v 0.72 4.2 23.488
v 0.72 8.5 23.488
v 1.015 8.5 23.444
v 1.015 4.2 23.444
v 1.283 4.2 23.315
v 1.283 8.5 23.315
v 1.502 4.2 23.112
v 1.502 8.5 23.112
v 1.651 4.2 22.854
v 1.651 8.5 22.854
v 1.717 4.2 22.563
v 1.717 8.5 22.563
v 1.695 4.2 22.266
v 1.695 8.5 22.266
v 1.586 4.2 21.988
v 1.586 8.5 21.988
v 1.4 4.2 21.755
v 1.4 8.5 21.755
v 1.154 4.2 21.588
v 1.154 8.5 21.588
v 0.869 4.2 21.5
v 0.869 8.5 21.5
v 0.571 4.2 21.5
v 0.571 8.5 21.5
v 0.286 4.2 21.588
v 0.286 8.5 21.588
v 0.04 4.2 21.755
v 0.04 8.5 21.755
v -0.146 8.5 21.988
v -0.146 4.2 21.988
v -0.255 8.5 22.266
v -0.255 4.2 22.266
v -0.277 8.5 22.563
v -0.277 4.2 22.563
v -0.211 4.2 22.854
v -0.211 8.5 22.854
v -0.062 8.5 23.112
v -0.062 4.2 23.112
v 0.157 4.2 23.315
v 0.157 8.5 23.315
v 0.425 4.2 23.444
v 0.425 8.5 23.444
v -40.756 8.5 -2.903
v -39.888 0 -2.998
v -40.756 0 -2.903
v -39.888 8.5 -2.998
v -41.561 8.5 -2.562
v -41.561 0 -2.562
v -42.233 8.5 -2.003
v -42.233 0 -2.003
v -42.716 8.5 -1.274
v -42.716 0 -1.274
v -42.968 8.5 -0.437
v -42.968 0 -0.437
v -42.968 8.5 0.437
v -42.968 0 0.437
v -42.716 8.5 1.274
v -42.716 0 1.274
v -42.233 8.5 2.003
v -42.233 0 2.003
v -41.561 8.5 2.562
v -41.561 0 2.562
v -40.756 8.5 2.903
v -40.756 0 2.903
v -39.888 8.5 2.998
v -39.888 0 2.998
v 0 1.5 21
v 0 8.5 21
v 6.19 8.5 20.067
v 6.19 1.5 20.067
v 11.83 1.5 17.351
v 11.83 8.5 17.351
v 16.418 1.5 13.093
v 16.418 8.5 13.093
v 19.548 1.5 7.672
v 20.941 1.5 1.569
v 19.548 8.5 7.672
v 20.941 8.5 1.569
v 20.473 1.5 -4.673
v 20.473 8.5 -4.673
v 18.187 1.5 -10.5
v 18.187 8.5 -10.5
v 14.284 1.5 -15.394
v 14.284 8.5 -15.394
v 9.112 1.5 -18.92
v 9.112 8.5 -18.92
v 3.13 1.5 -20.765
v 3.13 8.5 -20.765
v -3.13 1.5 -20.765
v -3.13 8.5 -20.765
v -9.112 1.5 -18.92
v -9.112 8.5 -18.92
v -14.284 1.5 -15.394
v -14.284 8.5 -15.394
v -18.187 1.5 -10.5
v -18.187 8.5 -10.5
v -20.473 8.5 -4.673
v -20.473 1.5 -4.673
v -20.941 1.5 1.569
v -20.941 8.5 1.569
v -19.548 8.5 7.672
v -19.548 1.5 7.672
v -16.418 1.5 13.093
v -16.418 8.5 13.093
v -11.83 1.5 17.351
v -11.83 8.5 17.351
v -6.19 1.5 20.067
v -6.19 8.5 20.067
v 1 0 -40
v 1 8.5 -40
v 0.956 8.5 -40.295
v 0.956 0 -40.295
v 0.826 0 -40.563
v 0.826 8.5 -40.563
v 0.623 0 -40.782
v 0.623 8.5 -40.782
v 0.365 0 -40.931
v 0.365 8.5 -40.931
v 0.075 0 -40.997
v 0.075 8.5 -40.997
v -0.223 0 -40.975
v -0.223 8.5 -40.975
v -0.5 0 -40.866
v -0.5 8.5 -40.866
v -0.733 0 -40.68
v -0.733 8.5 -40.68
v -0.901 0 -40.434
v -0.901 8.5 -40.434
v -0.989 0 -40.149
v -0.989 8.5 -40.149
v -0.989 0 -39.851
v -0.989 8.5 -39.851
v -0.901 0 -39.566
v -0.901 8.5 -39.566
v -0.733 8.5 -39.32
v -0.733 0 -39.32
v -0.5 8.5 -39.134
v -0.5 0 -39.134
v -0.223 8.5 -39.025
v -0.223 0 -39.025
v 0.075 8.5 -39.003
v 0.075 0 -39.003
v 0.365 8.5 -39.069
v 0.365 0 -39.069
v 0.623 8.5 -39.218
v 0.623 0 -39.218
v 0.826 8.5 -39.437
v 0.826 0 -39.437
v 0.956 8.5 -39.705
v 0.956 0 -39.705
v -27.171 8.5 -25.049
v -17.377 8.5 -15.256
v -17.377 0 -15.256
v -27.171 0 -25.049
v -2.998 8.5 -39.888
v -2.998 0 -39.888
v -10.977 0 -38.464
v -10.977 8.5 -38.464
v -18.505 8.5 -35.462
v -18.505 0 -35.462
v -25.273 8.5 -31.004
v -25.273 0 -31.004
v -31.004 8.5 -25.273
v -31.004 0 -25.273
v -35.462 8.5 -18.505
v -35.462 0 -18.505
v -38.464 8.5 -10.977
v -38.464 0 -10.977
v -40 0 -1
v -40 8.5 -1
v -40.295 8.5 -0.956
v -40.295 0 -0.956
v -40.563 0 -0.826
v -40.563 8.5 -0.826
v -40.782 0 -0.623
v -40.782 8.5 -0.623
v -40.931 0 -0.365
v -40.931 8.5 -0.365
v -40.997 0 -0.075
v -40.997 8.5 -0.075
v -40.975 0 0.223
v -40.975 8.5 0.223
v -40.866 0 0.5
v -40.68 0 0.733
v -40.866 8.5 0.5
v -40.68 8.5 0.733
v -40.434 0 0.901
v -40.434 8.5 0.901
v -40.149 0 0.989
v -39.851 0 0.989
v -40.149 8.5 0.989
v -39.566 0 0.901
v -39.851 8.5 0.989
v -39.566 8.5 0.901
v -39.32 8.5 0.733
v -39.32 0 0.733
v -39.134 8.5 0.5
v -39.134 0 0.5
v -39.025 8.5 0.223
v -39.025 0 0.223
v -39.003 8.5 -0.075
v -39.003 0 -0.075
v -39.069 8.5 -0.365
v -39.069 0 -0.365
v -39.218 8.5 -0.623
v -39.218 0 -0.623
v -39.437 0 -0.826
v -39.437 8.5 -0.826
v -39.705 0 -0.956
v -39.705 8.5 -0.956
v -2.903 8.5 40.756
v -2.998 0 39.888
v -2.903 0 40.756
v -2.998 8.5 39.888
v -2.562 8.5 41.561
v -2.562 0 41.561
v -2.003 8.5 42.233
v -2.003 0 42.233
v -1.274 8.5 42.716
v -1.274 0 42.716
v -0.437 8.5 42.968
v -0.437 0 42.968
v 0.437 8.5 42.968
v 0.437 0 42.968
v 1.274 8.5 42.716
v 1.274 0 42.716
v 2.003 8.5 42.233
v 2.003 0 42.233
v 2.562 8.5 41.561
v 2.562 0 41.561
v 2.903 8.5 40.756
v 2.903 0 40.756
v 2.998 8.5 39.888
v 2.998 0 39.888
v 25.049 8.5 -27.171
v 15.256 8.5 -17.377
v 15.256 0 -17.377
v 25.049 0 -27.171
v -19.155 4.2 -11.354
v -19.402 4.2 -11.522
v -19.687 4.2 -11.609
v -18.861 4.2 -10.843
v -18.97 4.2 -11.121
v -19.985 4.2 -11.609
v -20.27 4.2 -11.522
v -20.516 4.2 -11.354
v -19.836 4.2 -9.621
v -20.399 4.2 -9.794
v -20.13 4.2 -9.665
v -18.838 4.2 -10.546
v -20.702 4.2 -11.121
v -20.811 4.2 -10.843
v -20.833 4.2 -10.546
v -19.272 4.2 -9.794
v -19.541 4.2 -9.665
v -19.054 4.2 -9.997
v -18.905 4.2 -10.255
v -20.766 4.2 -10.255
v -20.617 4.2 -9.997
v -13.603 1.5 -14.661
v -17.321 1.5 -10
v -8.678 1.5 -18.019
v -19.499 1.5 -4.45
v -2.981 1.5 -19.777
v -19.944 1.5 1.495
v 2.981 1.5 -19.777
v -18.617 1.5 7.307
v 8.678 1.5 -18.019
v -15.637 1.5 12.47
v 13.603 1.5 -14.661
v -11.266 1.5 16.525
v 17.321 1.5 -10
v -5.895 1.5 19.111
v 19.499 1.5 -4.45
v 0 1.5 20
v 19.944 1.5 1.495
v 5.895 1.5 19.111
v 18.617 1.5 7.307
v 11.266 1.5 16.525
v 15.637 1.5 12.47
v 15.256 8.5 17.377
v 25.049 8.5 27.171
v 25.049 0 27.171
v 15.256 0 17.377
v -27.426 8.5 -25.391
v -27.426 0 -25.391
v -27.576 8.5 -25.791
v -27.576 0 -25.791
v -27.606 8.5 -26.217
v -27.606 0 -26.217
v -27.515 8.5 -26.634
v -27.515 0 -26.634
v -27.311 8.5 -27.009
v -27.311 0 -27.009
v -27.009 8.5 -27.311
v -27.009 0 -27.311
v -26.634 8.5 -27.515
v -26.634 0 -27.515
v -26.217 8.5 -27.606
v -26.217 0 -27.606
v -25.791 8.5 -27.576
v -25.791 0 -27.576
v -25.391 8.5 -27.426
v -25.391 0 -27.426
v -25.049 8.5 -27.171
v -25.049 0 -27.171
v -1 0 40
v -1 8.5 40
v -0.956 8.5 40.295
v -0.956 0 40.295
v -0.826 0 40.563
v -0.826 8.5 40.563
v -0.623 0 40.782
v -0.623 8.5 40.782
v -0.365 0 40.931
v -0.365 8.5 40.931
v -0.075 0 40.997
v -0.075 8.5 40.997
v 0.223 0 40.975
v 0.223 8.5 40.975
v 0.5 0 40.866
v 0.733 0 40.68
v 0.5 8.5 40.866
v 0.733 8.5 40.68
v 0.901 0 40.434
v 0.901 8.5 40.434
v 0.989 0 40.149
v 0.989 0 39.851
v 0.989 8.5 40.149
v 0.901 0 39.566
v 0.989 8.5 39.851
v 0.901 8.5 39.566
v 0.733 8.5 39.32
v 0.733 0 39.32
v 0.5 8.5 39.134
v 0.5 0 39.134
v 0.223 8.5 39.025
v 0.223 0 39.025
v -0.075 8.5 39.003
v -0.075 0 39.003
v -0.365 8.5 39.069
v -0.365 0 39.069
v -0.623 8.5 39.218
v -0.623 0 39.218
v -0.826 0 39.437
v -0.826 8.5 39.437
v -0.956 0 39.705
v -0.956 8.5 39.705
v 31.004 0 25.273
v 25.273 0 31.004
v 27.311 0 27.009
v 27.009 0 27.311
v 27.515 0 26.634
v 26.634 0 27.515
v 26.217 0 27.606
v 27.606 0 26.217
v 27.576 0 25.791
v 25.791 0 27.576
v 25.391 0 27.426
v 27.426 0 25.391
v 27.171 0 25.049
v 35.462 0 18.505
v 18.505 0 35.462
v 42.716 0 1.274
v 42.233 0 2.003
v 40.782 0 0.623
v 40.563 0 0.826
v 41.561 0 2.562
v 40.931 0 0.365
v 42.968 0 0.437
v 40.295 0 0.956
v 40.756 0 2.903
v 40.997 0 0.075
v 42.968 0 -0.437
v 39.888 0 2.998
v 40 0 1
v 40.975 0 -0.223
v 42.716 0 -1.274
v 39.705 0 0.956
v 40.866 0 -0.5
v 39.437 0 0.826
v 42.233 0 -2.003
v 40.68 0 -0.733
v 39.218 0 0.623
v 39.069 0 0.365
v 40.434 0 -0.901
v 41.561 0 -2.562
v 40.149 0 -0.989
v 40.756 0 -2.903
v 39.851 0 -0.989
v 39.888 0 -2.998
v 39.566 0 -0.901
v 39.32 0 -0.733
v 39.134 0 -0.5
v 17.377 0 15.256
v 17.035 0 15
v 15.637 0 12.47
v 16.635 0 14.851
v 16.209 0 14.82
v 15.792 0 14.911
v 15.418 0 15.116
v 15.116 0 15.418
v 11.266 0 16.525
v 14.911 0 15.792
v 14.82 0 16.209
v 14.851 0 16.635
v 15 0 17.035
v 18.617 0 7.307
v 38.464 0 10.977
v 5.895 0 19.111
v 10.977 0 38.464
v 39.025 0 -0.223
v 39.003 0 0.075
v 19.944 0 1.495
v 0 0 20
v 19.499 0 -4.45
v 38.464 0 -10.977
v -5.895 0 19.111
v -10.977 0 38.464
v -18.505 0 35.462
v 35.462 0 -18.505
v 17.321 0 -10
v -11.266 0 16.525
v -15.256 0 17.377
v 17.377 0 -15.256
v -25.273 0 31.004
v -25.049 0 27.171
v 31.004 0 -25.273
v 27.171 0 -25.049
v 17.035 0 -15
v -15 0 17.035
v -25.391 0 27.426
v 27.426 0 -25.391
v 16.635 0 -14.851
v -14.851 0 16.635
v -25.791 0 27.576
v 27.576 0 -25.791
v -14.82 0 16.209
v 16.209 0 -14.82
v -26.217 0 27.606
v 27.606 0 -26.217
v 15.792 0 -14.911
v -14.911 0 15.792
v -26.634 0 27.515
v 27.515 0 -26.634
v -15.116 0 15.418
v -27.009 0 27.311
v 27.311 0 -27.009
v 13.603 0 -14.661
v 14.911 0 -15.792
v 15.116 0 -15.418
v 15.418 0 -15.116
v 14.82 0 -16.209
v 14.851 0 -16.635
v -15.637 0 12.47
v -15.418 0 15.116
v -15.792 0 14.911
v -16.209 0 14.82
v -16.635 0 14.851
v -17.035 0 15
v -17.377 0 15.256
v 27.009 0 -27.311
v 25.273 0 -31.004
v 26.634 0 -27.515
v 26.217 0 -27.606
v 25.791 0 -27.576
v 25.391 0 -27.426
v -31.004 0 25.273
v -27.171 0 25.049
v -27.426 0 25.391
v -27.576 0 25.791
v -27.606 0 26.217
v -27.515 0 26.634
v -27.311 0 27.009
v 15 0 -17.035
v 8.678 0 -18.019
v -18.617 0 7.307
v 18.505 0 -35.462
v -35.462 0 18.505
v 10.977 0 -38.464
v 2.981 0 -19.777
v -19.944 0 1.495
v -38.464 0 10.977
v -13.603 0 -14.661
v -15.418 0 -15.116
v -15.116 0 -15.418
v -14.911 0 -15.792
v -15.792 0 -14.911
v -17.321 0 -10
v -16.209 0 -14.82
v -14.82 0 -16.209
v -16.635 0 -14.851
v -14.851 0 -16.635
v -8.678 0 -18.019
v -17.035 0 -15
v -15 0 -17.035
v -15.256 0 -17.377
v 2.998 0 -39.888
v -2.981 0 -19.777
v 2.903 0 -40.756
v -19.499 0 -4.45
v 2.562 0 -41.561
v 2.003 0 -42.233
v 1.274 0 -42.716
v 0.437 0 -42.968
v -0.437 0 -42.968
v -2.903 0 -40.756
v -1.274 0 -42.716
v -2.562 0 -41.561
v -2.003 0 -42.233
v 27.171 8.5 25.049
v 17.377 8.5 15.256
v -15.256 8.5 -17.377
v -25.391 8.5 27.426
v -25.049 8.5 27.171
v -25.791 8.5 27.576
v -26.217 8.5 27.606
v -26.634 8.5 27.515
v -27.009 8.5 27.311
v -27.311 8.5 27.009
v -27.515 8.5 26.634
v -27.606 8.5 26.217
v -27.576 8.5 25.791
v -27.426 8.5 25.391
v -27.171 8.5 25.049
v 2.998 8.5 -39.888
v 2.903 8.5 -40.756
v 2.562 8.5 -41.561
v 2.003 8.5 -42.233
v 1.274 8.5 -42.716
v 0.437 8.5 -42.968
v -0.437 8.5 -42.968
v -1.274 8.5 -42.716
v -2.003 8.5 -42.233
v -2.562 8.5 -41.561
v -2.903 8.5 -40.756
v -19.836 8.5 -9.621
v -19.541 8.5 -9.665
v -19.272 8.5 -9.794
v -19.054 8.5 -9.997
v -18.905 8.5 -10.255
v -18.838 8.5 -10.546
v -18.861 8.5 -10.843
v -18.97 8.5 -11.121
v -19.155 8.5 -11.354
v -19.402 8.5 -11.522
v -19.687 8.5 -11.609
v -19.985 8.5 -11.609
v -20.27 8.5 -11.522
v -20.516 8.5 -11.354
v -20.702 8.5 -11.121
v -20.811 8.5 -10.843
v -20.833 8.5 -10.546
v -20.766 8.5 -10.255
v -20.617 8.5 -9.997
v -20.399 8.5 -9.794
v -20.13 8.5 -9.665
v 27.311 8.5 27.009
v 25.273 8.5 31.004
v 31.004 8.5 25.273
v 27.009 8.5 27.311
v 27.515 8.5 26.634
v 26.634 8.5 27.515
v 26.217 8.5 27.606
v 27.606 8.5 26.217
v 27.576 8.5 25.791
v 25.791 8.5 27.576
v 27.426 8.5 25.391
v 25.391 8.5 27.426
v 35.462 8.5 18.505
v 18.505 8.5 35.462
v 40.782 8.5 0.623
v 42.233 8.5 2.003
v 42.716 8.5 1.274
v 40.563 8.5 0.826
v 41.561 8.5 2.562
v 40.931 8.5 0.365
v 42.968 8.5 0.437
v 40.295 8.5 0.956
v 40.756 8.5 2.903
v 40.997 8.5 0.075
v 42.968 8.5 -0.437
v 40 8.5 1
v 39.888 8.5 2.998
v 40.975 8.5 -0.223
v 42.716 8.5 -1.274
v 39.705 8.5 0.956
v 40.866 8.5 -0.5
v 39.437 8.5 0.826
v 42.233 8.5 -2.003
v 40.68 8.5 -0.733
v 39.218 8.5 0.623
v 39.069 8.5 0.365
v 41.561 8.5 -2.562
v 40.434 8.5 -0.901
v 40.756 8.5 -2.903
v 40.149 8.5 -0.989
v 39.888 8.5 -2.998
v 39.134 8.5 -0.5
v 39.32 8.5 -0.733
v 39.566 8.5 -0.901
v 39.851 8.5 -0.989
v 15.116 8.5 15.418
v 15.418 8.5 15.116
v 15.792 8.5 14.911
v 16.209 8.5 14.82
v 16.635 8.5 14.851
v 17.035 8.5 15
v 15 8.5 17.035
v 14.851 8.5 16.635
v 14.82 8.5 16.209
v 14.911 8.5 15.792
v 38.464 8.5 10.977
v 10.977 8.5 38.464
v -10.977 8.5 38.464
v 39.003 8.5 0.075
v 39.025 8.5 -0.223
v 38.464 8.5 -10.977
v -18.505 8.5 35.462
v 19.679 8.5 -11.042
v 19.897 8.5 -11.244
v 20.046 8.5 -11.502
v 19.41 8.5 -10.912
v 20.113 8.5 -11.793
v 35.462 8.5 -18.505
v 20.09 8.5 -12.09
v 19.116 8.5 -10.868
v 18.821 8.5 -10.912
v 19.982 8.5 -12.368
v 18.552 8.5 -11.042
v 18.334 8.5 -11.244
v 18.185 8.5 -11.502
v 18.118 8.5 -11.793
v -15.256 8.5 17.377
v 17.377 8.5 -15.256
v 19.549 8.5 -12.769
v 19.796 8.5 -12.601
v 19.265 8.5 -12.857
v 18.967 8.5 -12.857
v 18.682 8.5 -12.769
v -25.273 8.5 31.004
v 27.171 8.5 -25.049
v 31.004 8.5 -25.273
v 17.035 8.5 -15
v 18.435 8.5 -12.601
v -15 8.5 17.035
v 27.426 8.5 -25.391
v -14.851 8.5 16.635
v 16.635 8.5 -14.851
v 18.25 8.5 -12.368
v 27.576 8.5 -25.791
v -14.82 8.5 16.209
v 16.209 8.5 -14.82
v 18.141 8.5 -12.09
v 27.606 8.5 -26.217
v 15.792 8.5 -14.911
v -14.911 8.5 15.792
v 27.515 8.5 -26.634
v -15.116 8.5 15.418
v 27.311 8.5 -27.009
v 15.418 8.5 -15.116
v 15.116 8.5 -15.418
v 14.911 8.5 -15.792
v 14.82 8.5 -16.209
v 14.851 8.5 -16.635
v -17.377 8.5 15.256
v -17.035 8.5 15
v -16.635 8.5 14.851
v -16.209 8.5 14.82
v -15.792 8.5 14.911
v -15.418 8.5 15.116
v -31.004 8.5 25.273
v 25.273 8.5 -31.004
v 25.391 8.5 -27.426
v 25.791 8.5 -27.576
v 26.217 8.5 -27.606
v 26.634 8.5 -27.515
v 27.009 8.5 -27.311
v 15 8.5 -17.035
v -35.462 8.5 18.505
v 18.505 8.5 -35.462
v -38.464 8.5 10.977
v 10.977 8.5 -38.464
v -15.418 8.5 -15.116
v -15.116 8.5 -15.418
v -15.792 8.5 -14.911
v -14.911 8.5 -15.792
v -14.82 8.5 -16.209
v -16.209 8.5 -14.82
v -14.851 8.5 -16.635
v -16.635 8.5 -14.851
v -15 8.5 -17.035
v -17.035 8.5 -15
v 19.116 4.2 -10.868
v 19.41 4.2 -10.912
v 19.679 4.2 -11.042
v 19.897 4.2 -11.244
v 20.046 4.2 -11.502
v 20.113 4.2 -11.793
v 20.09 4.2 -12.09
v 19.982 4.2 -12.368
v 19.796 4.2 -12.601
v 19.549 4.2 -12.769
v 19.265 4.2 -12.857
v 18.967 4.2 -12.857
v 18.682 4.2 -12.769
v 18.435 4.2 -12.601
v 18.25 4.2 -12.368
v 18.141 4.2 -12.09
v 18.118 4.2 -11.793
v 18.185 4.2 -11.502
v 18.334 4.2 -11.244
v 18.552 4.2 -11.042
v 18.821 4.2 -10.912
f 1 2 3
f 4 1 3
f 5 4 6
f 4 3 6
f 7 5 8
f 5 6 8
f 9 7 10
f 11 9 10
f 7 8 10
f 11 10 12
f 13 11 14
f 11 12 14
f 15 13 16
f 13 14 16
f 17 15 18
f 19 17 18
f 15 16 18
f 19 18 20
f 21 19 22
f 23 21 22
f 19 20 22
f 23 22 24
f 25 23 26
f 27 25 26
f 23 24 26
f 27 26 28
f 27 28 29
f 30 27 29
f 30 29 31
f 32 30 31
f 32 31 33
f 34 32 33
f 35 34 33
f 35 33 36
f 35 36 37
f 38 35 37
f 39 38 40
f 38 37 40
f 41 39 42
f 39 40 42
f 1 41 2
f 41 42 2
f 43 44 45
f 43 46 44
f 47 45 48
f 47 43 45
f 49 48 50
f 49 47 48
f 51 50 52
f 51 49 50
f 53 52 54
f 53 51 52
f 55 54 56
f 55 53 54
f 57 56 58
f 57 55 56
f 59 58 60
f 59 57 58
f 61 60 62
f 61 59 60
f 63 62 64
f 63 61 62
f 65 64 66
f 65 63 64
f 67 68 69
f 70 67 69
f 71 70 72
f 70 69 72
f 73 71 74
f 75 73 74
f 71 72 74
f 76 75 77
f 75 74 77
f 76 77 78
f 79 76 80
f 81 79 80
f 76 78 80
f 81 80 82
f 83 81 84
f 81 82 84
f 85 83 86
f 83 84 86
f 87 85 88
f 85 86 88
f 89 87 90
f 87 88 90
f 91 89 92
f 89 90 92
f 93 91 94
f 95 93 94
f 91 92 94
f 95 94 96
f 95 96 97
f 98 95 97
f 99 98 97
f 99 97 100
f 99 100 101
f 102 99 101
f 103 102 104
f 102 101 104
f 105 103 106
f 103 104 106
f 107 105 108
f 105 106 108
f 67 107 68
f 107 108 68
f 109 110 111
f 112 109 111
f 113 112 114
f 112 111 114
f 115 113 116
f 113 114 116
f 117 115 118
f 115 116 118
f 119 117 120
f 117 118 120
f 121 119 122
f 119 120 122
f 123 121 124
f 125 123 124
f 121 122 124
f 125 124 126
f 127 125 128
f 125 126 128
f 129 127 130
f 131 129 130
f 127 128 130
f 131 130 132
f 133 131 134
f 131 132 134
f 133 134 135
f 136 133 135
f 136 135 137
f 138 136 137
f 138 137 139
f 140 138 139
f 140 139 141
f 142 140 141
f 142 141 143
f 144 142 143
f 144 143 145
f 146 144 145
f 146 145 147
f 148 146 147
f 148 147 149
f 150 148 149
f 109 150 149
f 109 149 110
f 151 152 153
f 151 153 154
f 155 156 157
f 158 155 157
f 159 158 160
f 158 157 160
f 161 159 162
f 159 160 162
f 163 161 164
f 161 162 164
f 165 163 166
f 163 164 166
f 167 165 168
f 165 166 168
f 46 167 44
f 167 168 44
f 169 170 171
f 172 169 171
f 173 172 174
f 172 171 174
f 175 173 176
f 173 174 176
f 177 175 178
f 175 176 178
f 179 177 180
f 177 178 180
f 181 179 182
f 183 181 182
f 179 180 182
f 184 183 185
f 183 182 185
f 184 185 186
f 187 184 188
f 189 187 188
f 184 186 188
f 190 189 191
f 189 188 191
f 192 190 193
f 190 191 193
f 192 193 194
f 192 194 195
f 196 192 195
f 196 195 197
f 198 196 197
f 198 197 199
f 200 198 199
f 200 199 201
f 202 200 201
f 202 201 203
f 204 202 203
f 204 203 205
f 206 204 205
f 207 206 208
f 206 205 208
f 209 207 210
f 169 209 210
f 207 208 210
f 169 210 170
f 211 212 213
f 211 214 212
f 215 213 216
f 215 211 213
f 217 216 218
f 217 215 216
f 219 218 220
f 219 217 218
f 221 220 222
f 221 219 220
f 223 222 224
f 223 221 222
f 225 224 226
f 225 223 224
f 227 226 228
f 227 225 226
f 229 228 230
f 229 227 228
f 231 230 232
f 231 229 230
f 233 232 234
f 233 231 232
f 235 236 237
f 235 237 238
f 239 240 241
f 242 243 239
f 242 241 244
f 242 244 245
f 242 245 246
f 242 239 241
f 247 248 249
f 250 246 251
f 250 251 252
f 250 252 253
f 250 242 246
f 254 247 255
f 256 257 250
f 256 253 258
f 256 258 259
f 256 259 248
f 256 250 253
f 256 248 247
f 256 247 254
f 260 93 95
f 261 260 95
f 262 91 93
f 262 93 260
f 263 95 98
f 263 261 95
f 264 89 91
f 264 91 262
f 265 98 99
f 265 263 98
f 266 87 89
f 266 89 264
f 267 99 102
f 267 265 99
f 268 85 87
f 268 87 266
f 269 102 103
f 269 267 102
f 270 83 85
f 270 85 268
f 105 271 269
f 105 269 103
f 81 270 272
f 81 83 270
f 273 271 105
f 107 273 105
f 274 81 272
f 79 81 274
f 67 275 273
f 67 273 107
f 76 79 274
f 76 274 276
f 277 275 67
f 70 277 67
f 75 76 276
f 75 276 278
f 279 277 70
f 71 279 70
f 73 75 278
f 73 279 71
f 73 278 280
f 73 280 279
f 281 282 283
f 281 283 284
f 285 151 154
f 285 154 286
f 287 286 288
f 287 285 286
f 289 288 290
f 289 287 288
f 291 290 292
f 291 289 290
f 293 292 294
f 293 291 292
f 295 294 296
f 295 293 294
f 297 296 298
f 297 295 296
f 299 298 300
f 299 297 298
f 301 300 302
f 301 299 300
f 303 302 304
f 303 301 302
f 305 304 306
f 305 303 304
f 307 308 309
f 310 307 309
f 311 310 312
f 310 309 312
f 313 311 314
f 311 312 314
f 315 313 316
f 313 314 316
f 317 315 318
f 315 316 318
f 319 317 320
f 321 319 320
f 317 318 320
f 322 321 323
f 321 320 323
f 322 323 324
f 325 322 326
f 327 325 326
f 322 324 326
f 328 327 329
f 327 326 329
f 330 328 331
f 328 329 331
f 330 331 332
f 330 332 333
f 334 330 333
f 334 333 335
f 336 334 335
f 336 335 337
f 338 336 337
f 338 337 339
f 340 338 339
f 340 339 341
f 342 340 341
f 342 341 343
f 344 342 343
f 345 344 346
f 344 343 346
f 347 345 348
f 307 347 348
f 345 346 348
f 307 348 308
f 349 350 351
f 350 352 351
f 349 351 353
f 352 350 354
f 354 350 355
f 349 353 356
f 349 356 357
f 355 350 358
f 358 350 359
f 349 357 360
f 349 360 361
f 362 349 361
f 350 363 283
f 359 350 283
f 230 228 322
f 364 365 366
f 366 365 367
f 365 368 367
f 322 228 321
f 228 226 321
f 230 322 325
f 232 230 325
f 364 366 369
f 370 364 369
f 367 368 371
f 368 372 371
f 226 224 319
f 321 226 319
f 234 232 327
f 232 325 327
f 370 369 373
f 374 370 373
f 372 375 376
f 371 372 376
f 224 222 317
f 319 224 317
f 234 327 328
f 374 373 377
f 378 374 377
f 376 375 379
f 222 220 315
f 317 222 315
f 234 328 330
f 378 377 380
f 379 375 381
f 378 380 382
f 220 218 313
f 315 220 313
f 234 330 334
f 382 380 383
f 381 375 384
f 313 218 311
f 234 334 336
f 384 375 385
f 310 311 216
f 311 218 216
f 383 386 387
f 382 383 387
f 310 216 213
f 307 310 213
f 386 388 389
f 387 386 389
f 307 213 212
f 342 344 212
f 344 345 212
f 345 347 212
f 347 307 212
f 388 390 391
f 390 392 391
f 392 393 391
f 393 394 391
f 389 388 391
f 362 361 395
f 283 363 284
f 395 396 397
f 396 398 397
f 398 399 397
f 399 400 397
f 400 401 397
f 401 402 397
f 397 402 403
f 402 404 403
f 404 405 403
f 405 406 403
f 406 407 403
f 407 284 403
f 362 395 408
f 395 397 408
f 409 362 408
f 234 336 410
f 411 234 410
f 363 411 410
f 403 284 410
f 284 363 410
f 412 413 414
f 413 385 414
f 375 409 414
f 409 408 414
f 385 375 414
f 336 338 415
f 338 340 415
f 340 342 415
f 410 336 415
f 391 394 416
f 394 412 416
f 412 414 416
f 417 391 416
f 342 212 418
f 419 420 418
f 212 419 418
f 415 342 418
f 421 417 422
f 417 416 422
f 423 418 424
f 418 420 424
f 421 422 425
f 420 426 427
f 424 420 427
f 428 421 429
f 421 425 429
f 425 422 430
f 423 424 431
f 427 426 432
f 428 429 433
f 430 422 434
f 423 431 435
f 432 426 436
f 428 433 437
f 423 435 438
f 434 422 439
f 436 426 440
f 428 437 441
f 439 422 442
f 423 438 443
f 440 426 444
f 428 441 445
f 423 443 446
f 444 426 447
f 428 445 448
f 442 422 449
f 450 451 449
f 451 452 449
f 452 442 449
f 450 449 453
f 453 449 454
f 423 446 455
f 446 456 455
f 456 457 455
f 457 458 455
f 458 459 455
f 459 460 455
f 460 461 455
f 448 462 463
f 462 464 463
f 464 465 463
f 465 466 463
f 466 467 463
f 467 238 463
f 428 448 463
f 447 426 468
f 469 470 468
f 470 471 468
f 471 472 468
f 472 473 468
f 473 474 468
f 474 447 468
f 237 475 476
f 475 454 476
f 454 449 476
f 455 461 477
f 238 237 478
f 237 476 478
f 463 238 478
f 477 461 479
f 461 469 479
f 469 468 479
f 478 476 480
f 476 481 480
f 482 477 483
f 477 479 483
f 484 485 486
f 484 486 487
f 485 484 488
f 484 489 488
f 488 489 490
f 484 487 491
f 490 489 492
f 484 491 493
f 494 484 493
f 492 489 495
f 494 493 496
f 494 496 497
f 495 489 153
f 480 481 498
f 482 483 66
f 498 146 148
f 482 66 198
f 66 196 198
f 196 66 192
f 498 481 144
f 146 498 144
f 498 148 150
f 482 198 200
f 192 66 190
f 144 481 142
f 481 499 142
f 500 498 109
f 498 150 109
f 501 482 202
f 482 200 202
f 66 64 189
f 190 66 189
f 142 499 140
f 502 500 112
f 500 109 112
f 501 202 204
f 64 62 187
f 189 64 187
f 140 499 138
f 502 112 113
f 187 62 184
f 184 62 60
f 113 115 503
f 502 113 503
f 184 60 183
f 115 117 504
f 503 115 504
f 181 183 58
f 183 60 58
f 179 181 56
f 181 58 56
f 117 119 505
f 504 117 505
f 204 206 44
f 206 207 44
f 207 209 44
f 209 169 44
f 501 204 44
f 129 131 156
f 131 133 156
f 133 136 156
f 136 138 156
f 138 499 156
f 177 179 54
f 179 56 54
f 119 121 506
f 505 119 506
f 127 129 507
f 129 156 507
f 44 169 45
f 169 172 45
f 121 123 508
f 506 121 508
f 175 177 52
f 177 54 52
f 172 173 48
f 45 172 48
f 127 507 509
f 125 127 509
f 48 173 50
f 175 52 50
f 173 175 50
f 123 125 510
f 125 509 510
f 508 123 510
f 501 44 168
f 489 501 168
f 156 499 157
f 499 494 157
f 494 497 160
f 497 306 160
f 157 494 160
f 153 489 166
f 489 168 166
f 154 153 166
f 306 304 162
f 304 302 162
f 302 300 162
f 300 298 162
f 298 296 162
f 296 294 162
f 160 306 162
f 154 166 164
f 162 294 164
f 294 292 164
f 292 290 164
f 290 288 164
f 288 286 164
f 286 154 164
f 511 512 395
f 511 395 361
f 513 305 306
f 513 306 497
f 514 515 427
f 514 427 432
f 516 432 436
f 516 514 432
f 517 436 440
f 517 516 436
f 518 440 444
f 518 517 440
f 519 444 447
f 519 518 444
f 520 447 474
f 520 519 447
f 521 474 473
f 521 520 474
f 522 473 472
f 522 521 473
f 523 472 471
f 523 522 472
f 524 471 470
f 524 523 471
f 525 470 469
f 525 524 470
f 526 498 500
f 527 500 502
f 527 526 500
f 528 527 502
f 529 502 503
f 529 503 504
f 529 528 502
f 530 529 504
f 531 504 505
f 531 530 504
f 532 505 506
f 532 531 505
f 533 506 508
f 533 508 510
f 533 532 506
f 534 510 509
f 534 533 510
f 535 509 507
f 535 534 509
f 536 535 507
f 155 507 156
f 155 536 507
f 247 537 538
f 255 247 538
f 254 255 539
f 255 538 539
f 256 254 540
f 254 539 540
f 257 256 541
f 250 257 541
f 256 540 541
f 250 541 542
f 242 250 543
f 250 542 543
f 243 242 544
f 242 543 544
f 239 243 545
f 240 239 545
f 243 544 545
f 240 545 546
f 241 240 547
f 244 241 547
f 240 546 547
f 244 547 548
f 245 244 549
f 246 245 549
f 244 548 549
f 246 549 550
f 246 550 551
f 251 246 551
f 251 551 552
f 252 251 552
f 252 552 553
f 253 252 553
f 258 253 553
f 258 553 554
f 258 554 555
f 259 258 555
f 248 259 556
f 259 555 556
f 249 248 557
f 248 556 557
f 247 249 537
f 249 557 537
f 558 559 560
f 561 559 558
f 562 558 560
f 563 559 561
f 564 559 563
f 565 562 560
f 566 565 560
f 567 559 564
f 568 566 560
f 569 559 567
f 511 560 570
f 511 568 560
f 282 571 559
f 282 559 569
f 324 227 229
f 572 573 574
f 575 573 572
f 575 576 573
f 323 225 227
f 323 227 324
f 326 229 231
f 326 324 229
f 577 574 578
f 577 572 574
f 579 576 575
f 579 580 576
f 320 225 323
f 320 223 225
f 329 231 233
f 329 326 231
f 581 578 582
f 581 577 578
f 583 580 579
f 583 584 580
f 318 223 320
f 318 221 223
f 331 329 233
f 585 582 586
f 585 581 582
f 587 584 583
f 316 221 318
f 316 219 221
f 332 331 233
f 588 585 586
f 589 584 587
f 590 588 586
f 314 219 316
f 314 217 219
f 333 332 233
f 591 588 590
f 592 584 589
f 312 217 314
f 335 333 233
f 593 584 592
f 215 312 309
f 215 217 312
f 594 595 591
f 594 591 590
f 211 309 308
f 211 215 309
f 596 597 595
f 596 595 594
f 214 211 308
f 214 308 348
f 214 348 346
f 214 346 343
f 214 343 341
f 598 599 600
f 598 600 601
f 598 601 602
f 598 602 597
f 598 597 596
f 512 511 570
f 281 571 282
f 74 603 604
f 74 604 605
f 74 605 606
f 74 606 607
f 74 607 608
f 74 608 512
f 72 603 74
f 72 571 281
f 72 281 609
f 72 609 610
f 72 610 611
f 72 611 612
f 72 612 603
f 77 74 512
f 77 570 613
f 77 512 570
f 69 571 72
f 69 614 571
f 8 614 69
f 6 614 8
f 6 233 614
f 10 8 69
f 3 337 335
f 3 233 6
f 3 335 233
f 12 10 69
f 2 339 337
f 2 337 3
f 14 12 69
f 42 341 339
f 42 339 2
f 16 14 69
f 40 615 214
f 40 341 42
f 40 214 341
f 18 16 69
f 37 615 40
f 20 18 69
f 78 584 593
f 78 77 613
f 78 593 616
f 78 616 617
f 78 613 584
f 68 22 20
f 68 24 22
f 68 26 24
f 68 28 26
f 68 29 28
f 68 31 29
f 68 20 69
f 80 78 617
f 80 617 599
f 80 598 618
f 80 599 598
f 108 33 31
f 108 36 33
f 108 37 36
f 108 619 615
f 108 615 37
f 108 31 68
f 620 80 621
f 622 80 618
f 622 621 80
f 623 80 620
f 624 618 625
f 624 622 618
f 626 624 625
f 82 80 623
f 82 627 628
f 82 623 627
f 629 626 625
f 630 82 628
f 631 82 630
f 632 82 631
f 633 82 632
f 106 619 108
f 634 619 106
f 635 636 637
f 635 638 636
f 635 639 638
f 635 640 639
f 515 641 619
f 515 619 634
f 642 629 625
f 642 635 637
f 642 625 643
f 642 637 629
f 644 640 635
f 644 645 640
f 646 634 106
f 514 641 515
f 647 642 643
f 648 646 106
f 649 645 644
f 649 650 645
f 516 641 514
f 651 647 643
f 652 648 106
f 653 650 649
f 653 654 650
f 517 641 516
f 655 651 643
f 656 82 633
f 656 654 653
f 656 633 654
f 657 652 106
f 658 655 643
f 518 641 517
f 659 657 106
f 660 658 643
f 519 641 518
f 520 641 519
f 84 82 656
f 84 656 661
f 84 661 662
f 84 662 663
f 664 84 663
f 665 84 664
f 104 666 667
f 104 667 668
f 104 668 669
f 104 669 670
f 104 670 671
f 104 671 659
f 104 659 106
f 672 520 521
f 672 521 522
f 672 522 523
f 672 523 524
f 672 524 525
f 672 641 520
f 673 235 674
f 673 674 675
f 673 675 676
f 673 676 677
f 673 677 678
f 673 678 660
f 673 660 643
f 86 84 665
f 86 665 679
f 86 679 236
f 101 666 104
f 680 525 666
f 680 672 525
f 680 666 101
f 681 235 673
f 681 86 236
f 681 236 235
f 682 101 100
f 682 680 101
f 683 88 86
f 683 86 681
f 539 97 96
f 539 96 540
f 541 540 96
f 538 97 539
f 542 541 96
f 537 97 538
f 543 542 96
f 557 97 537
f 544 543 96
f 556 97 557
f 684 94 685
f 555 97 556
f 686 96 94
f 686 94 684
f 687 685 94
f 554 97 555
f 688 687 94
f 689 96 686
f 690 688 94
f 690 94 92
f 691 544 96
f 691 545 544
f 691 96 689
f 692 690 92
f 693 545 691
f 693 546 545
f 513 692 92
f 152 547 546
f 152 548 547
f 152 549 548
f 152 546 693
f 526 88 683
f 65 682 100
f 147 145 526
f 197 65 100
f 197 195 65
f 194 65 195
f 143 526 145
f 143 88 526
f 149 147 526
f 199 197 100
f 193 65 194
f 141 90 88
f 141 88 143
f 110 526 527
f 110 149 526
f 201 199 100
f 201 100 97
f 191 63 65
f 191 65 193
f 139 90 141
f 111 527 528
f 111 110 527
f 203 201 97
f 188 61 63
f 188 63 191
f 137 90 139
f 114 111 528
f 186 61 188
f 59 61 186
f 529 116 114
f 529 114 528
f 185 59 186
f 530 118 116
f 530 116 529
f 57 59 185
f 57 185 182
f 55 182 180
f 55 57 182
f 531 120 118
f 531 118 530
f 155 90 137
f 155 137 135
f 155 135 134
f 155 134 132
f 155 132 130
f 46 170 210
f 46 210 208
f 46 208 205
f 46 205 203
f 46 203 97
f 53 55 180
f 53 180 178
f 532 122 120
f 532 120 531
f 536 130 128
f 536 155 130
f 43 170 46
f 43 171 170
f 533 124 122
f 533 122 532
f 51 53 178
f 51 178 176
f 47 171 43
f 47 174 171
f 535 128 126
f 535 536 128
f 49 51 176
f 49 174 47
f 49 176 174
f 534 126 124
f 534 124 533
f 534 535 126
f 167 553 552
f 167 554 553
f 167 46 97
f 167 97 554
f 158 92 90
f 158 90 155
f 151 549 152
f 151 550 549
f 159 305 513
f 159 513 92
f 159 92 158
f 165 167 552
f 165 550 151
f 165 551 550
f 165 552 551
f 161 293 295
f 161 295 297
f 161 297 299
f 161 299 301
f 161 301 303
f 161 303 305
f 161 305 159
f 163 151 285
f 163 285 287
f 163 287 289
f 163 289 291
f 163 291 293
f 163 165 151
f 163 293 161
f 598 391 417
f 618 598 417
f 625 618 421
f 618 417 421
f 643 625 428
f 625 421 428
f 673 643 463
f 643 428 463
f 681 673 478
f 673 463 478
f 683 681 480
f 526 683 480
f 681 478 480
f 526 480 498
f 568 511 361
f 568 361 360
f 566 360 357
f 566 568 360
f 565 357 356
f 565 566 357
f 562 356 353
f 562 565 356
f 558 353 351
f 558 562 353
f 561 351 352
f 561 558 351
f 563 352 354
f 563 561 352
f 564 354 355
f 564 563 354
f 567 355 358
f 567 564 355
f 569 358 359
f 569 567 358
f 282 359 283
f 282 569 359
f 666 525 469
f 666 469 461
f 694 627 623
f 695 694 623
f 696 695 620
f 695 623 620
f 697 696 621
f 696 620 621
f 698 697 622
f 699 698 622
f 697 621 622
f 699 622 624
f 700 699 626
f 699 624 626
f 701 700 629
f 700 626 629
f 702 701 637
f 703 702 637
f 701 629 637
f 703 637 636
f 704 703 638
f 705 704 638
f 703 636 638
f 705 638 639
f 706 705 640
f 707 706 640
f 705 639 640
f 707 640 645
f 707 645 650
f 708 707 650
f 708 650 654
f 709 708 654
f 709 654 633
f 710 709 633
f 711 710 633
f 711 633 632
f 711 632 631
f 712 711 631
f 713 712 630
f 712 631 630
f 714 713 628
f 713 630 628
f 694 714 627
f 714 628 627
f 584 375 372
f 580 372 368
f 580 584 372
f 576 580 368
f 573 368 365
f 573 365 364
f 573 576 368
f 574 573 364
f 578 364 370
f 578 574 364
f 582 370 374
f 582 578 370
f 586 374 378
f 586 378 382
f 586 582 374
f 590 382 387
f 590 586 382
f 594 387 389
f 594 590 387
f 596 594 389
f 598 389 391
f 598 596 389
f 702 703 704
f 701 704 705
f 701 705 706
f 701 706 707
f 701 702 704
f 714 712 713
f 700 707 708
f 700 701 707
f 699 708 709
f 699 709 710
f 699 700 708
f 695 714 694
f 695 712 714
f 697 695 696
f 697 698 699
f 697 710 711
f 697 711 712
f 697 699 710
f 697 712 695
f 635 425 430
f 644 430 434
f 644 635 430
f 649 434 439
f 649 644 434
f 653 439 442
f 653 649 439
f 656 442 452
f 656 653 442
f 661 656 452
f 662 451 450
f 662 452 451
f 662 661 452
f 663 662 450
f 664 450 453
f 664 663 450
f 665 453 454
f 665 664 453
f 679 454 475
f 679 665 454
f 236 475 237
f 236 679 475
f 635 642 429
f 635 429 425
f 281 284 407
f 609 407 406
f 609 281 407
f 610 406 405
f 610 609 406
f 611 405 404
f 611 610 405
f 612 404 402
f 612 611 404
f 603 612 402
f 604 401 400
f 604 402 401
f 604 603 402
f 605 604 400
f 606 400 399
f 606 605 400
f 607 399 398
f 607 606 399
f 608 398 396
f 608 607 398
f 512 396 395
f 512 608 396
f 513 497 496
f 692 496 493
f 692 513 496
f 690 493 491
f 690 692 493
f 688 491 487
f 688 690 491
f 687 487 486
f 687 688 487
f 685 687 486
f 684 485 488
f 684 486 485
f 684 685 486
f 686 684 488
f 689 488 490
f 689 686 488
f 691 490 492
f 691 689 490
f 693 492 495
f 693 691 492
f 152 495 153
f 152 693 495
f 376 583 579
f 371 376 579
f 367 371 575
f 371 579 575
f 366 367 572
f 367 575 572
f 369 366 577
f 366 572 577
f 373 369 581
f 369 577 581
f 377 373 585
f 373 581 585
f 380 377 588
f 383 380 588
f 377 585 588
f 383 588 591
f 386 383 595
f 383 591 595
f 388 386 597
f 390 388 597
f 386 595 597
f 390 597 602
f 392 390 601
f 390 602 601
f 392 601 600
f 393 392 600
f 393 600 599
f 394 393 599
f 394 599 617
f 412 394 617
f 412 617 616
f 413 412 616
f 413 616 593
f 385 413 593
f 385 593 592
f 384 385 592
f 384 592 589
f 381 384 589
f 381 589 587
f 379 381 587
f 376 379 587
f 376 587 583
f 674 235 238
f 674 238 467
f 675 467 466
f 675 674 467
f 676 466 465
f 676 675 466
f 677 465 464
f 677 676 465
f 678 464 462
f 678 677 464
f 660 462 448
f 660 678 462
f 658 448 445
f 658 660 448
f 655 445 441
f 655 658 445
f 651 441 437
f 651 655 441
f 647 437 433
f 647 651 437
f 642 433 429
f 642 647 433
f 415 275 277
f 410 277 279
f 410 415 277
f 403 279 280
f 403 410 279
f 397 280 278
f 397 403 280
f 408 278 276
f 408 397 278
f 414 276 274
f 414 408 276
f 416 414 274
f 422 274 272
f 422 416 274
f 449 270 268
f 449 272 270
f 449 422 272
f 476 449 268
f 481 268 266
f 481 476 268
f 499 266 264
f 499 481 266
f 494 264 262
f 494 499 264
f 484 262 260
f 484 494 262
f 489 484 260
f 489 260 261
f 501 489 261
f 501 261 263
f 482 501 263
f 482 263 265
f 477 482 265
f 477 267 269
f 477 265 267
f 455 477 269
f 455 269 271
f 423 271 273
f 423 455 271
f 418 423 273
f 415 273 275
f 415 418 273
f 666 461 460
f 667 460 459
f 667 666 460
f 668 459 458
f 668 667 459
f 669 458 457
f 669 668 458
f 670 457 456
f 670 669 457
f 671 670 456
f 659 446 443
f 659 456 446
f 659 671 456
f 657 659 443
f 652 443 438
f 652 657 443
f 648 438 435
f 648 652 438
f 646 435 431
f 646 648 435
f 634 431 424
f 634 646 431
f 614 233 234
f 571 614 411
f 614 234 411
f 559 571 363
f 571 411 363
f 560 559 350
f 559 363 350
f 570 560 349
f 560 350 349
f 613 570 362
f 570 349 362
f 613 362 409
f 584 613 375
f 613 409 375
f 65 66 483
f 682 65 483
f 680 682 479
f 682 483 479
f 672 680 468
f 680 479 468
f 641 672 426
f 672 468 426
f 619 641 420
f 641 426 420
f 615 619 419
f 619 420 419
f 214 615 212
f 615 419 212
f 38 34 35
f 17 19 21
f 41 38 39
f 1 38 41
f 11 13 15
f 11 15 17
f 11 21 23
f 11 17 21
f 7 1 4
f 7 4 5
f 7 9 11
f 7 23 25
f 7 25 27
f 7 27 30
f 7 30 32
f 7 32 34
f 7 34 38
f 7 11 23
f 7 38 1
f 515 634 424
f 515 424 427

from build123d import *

# Parameters (mm, degrees)
SKETCH1_R                               = 40
SKETCH1_R_2                             = 20
BOSS_EXTRUDE1_DEPTH                     = 8.5
SKETCH2_R                               = 1
CUT_EXTRUDE2_DEPTH                      = 58.203583804
SKETCH2_6_R                             = 3
SKETCH2_6_R_2                           = 1
BOSS_EXTRUDE3_DEPTH                     = 8.5
CIRPATTERN1_COUNT                       = 4
CUT_EXTRUDE4_DEPTH                      = 62.402361518
CIRPATTERN3_COUNT                       = 4
SKETCH7_R                               = 21
CUT_EXTRUDE5_DEPTH                      = 7
SKETCH8_R                               = 1
OUTER_RETAINER_M2_TAPPED_ENVELOPE_DEPTH = 4.3


with BuildPart() as part:
    # Sketch1 → Boss-Extrude1 (new body)
    with BuildSketch(Plane(origin=(0, 0, 0), x_dir=(1, 0, 0), z_dir=(0, 1, 0))):
        Circle(SKETCH1_R)
        Circle(SKETCH1_R_2, mode=Mode.SUBTRACT)
    extrude(amount=BOSS_EXTRUDE1_DEPTH)

    # Sketch2 → Cut-Extrude2 (cut, through all)
    with BuildSketch(Plane(origin=(0, 8.5, 0), x_dir=(1, 0, 0), z_dir=(0, 1, 0))):
        with Locations((40, 0)):
            Circle(SKETCH2_R)
    cut_extrude2 = extrude(amount=-CUT_EXTRUDE2_DEPTH, mode=Mode.SUBTRACT)

    # Sketch2<6> → Boss-Extrude3 (add)
    with BuildSketch(Plane(origin=(0, 8.5, 0), x_dir=(1, 0, 0), z_dir=(0, 1, 0))):
        with Locations((40, 0)):
            Circle(SKETCH2_6_R)
        with Locations((40, 0)):
            Circle(SKETCH2_6_R_2, mode=Mode.SUBTRACT)
    boss_extrude3 = extrude(amount=-BOSS_EXTRUDE3_DEPTH)

    # CirPattern1: Cut-Extrude2, Boss-Extrude3 ×4 about axis
    cirpattern1_axis = Axis((0, 8.5, 0), (0, 1, 0))
    add([cut_extrude2.rotate(cirpattern1_axis, i * 360 / CIRPATTERN1_COUNT) for i in range(1, CIRPATTERN1_COUNT)], mode=Mode.SUBTRACT)
    add([boss_extrude3.rotate(cirpattern1_axis, i * 360 / CIRPATTERN1_COUNT) for i in range(1, CIRPATTERN1_COUNT)])

    # Sketch4 → Cut-Extrude4 (cut, through all)
    with BuildSketch(Plane(origin=(0, 8.5, 0), x_dir=(1, 0, 0), z_dir=(0, 1, 0))):
        with BuildLine():
            Line((-27.170578067, -25.049257724), (-17.377149148, -15.255828804))
            ThreePointArc((-17.377149148, -15.255828804), (-15.255828804, -15.255828804), (-15.255828804, -17.377149148))
            Line((-15.255828804, -17.377149148), (-25.049257724, -27.170578067))
            ThreePointArc((-25.049257724, -27.170578067), (-27.170578067, -27.170578067), (-27.170578067, -25.049257724))
        make_face()
    cut_extrude4 = extrude(amount=-CUT_EXTRUDE4_DEPTH, mode=Mode.SUBTRACT)

    # CirPattern3: Cut-Extrude4 ×4 about axis
    cirpattern3_axis = Axis((0, 8.5, 0), (0, 1, 0))
    for i in range(1, CIRPATTERN3_COUNT):
        add(cut_extrude4.rotate(cirpattern3_axis, i * 360 / CIRPATTERN3_COUNT), mode=Mode.SUBTRACT)

    # Sketch7 → Cut-Extrude5 (cut)
    with BuildSketch(Plane(origin=(0, 8.5, 0), x_dir=(1, 0, 0), z_dir=(0, 1, 0))):
        Circle(SKETCH7_R)
    extrude(amount=-CUT_EXTRUDE5_DEPTH, mode=Mode.SUBTRACT)

    # Sketch8 → Outer_Retainer_M2_Tapped_Envelope (cut)
    with BuildSketch(Plane(origin=(0, 8.5, 0), x_dir=(1, 0, 0), z_dir=(0, 1, 0))):
        with Locations((0.720053396, -22.48847534)):
            Circle(SKETCH8_R)
        with Locations((19.115564239, 11.867822203)):
            Circle(SKETCH8_R)
        with Locations((-19.835617634, 10.620653137)):
            Circle(SKETCH8_R)
    extrude(amount=-OUTER_RETAINER_M2_TAPPED_ENVELOPE_DEPTH, mode=Mode.SUBTRACT)


solid = part.part
